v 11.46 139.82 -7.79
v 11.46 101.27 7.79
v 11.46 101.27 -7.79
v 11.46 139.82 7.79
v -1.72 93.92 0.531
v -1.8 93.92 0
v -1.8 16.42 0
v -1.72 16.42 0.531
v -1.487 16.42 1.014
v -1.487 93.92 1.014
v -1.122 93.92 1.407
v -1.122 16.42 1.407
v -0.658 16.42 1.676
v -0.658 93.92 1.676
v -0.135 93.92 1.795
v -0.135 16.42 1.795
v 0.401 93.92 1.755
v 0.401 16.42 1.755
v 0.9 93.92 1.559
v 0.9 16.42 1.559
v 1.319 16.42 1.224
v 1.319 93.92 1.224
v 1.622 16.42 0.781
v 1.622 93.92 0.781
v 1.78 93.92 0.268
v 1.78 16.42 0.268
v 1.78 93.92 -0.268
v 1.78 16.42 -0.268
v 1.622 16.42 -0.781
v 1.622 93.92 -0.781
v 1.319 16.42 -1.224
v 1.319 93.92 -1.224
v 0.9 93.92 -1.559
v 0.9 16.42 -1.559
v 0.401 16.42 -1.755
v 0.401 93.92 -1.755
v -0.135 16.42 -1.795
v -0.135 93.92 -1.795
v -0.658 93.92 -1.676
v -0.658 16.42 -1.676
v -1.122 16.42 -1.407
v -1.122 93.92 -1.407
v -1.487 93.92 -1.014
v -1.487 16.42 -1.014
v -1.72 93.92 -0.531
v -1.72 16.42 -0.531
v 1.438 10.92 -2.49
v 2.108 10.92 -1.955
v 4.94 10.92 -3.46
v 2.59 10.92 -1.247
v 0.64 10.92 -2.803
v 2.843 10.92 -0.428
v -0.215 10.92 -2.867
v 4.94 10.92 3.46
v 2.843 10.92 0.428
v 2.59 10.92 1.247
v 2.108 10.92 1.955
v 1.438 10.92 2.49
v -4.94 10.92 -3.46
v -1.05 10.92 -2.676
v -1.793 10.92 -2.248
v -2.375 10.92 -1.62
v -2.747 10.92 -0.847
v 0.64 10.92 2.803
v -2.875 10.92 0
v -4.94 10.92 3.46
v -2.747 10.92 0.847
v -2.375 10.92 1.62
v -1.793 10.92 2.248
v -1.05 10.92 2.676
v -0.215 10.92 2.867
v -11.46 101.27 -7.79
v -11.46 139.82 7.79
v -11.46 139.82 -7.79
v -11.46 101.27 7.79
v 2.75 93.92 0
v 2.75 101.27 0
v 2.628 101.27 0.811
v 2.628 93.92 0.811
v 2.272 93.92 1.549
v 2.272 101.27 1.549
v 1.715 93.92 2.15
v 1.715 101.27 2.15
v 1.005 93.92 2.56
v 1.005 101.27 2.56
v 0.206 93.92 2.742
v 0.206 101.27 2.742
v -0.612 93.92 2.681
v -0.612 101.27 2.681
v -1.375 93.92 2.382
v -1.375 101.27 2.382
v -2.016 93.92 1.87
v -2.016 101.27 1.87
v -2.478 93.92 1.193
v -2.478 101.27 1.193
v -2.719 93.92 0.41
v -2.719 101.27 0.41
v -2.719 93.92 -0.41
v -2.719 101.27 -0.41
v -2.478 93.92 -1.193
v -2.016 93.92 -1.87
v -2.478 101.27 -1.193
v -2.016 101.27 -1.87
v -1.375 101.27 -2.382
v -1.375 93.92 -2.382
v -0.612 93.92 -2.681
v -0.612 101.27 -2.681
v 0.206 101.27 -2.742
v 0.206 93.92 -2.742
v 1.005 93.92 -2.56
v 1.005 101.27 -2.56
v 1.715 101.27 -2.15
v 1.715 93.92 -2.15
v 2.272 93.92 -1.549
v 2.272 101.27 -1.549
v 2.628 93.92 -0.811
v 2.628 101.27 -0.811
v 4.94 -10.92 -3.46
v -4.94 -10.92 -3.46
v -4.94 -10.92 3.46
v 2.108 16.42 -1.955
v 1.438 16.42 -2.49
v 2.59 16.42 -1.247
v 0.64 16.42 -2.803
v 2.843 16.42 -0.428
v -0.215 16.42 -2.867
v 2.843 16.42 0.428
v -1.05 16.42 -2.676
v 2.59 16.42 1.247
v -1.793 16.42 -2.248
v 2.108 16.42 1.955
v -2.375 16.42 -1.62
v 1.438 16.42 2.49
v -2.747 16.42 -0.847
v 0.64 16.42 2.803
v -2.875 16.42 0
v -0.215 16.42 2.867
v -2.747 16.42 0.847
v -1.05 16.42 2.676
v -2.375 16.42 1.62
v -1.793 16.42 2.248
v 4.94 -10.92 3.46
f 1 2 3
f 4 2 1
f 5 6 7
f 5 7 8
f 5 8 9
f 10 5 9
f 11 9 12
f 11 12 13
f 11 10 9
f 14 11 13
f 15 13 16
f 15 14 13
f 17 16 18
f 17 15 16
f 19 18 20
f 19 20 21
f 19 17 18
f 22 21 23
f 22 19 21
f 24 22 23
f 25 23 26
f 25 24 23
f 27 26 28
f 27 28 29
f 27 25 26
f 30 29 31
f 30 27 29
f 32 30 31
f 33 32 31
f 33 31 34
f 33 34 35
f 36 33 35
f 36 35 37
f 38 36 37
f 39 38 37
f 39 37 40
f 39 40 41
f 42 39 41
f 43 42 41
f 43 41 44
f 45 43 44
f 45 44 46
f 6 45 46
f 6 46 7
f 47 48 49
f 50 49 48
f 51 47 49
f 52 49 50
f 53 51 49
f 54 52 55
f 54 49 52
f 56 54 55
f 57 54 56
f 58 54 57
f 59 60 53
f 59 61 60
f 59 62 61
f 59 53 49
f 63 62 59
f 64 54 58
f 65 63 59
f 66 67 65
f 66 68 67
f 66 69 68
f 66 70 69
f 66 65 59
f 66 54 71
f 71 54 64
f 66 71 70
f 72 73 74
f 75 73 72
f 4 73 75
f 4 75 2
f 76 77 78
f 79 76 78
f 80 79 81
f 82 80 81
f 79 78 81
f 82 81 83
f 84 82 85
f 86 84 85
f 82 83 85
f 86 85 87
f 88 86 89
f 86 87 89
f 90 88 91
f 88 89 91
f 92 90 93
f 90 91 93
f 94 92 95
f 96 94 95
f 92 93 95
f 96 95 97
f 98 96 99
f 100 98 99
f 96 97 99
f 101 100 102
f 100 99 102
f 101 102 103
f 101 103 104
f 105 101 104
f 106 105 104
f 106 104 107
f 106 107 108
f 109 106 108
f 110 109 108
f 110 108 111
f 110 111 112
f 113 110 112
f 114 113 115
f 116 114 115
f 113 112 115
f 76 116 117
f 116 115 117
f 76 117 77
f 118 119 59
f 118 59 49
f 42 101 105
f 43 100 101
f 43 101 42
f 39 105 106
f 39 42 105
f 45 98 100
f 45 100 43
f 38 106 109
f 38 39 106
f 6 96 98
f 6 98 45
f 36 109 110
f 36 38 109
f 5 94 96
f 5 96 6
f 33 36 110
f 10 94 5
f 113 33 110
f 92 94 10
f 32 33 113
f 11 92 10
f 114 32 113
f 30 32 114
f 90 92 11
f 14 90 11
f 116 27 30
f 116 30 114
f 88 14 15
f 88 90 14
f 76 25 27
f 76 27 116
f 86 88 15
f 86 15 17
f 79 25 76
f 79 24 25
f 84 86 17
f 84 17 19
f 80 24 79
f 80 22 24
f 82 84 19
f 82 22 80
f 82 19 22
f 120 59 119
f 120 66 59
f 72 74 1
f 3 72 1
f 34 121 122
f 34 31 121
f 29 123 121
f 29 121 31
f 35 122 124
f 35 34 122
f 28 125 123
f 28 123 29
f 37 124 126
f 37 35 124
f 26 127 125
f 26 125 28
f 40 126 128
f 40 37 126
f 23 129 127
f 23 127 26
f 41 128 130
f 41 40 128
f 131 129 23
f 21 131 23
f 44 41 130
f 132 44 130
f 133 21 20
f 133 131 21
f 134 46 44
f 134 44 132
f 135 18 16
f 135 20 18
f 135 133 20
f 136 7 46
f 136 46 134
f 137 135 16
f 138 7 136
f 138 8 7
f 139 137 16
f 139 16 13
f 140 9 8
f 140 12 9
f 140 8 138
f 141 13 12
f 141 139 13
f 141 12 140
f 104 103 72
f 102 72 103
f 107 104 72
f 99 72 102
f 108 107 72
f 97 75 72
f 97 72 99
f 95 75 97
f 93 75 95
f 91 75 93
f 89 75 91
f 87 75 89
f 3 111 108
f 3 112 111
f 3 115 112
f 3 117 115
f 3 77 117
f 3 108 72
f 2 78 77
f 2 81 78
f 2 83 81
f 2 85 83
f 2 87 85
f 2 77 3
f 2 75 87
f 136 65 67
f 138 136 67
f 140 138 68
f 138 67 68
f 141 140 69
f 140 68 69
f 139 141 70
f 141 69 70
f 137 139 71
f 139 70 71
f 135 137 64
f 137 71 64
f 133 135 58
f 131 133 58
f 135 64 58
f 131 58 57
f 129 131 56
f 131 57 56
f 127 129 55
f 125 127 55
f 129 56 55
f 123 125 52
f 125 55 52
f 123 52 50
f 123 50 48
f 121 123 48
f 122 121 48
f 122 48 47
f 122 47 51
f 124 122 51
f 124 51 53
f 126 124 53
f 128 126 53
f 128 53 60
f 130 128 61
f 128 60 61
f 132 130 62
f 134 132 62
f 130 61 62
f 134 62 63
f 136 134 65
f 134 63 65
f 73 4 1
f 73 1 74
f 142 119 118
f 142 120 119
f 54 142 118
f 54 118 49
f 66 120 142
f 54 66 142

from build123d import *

# Parameters (mm, degrees)
F1_DEPTH = 7.79
F2_DEPTH = 3.46
F3_R     = 2.875
F4_DEPTH = 5.5
F5_R     = 1.8
F7_R     = 2.75
F8_DEPTH = 7.35


with BuildPart() as f1:
    # F0 (on Top) → F1 (new body, symmetric)
    with BuildSketch(Plane.XY):
        Polygon((-2.75, 101.27), (2.75, 101.27), (11.46, 101.27), (11.46, 139.82), (-11.46, 139.82), (-11.46, 101.27), align=None)
    extrude(amount=F1_DEPTH, both=True)



with BuildPart() as f2:
    # F0 (on Top) → F2 (new body, symmetric)
    with BuildSketch(Plane.XY):
        Polygon((-4.94, -10.92), (4.94, -10.92), (4.94, 10.92), (2.875, 10.92), (-2.875, 10.92), (-4.94, 10.92), align=None)
    extrude(amount=F2_DEPTH, both=True)

    # F3 (on face) → F4 (join, through all)
    with BuildSketch(Plane(origin=(0, 10.92, 0), x_dir=(-1, 0, 0), z_dir=(0, 1, 0))):
        Circle(F3_R)
    extrude(amount=F4_DEPTH)

    # F6: sweep along a path in F0
    with BuildLine(Plane.XY) as f6_path:
        Line((1.8, 16.42), (1.8, 93.92))
    # F5 (on face) → F6 (sweep)
    with BuildSketch(Plane(origin=(0, 16.42, 0), x_dir=(-1, 0, 0), z_dir=(0, 1, 0))):
        Circle(F5_R)
    sweep(path=f6_path.line)


with BuildPart() as f1_1:
    add(f1.part)

    add(f2.part)  # F8 merges F2
    # F7 (on face) → F8 (join, through all)
    with BuildSketch(Plane.XZ.offset(-101.27)):
        Circle(F7_R)
    extrude(amount=F8_DEPTH)


solid = f1_1.part
